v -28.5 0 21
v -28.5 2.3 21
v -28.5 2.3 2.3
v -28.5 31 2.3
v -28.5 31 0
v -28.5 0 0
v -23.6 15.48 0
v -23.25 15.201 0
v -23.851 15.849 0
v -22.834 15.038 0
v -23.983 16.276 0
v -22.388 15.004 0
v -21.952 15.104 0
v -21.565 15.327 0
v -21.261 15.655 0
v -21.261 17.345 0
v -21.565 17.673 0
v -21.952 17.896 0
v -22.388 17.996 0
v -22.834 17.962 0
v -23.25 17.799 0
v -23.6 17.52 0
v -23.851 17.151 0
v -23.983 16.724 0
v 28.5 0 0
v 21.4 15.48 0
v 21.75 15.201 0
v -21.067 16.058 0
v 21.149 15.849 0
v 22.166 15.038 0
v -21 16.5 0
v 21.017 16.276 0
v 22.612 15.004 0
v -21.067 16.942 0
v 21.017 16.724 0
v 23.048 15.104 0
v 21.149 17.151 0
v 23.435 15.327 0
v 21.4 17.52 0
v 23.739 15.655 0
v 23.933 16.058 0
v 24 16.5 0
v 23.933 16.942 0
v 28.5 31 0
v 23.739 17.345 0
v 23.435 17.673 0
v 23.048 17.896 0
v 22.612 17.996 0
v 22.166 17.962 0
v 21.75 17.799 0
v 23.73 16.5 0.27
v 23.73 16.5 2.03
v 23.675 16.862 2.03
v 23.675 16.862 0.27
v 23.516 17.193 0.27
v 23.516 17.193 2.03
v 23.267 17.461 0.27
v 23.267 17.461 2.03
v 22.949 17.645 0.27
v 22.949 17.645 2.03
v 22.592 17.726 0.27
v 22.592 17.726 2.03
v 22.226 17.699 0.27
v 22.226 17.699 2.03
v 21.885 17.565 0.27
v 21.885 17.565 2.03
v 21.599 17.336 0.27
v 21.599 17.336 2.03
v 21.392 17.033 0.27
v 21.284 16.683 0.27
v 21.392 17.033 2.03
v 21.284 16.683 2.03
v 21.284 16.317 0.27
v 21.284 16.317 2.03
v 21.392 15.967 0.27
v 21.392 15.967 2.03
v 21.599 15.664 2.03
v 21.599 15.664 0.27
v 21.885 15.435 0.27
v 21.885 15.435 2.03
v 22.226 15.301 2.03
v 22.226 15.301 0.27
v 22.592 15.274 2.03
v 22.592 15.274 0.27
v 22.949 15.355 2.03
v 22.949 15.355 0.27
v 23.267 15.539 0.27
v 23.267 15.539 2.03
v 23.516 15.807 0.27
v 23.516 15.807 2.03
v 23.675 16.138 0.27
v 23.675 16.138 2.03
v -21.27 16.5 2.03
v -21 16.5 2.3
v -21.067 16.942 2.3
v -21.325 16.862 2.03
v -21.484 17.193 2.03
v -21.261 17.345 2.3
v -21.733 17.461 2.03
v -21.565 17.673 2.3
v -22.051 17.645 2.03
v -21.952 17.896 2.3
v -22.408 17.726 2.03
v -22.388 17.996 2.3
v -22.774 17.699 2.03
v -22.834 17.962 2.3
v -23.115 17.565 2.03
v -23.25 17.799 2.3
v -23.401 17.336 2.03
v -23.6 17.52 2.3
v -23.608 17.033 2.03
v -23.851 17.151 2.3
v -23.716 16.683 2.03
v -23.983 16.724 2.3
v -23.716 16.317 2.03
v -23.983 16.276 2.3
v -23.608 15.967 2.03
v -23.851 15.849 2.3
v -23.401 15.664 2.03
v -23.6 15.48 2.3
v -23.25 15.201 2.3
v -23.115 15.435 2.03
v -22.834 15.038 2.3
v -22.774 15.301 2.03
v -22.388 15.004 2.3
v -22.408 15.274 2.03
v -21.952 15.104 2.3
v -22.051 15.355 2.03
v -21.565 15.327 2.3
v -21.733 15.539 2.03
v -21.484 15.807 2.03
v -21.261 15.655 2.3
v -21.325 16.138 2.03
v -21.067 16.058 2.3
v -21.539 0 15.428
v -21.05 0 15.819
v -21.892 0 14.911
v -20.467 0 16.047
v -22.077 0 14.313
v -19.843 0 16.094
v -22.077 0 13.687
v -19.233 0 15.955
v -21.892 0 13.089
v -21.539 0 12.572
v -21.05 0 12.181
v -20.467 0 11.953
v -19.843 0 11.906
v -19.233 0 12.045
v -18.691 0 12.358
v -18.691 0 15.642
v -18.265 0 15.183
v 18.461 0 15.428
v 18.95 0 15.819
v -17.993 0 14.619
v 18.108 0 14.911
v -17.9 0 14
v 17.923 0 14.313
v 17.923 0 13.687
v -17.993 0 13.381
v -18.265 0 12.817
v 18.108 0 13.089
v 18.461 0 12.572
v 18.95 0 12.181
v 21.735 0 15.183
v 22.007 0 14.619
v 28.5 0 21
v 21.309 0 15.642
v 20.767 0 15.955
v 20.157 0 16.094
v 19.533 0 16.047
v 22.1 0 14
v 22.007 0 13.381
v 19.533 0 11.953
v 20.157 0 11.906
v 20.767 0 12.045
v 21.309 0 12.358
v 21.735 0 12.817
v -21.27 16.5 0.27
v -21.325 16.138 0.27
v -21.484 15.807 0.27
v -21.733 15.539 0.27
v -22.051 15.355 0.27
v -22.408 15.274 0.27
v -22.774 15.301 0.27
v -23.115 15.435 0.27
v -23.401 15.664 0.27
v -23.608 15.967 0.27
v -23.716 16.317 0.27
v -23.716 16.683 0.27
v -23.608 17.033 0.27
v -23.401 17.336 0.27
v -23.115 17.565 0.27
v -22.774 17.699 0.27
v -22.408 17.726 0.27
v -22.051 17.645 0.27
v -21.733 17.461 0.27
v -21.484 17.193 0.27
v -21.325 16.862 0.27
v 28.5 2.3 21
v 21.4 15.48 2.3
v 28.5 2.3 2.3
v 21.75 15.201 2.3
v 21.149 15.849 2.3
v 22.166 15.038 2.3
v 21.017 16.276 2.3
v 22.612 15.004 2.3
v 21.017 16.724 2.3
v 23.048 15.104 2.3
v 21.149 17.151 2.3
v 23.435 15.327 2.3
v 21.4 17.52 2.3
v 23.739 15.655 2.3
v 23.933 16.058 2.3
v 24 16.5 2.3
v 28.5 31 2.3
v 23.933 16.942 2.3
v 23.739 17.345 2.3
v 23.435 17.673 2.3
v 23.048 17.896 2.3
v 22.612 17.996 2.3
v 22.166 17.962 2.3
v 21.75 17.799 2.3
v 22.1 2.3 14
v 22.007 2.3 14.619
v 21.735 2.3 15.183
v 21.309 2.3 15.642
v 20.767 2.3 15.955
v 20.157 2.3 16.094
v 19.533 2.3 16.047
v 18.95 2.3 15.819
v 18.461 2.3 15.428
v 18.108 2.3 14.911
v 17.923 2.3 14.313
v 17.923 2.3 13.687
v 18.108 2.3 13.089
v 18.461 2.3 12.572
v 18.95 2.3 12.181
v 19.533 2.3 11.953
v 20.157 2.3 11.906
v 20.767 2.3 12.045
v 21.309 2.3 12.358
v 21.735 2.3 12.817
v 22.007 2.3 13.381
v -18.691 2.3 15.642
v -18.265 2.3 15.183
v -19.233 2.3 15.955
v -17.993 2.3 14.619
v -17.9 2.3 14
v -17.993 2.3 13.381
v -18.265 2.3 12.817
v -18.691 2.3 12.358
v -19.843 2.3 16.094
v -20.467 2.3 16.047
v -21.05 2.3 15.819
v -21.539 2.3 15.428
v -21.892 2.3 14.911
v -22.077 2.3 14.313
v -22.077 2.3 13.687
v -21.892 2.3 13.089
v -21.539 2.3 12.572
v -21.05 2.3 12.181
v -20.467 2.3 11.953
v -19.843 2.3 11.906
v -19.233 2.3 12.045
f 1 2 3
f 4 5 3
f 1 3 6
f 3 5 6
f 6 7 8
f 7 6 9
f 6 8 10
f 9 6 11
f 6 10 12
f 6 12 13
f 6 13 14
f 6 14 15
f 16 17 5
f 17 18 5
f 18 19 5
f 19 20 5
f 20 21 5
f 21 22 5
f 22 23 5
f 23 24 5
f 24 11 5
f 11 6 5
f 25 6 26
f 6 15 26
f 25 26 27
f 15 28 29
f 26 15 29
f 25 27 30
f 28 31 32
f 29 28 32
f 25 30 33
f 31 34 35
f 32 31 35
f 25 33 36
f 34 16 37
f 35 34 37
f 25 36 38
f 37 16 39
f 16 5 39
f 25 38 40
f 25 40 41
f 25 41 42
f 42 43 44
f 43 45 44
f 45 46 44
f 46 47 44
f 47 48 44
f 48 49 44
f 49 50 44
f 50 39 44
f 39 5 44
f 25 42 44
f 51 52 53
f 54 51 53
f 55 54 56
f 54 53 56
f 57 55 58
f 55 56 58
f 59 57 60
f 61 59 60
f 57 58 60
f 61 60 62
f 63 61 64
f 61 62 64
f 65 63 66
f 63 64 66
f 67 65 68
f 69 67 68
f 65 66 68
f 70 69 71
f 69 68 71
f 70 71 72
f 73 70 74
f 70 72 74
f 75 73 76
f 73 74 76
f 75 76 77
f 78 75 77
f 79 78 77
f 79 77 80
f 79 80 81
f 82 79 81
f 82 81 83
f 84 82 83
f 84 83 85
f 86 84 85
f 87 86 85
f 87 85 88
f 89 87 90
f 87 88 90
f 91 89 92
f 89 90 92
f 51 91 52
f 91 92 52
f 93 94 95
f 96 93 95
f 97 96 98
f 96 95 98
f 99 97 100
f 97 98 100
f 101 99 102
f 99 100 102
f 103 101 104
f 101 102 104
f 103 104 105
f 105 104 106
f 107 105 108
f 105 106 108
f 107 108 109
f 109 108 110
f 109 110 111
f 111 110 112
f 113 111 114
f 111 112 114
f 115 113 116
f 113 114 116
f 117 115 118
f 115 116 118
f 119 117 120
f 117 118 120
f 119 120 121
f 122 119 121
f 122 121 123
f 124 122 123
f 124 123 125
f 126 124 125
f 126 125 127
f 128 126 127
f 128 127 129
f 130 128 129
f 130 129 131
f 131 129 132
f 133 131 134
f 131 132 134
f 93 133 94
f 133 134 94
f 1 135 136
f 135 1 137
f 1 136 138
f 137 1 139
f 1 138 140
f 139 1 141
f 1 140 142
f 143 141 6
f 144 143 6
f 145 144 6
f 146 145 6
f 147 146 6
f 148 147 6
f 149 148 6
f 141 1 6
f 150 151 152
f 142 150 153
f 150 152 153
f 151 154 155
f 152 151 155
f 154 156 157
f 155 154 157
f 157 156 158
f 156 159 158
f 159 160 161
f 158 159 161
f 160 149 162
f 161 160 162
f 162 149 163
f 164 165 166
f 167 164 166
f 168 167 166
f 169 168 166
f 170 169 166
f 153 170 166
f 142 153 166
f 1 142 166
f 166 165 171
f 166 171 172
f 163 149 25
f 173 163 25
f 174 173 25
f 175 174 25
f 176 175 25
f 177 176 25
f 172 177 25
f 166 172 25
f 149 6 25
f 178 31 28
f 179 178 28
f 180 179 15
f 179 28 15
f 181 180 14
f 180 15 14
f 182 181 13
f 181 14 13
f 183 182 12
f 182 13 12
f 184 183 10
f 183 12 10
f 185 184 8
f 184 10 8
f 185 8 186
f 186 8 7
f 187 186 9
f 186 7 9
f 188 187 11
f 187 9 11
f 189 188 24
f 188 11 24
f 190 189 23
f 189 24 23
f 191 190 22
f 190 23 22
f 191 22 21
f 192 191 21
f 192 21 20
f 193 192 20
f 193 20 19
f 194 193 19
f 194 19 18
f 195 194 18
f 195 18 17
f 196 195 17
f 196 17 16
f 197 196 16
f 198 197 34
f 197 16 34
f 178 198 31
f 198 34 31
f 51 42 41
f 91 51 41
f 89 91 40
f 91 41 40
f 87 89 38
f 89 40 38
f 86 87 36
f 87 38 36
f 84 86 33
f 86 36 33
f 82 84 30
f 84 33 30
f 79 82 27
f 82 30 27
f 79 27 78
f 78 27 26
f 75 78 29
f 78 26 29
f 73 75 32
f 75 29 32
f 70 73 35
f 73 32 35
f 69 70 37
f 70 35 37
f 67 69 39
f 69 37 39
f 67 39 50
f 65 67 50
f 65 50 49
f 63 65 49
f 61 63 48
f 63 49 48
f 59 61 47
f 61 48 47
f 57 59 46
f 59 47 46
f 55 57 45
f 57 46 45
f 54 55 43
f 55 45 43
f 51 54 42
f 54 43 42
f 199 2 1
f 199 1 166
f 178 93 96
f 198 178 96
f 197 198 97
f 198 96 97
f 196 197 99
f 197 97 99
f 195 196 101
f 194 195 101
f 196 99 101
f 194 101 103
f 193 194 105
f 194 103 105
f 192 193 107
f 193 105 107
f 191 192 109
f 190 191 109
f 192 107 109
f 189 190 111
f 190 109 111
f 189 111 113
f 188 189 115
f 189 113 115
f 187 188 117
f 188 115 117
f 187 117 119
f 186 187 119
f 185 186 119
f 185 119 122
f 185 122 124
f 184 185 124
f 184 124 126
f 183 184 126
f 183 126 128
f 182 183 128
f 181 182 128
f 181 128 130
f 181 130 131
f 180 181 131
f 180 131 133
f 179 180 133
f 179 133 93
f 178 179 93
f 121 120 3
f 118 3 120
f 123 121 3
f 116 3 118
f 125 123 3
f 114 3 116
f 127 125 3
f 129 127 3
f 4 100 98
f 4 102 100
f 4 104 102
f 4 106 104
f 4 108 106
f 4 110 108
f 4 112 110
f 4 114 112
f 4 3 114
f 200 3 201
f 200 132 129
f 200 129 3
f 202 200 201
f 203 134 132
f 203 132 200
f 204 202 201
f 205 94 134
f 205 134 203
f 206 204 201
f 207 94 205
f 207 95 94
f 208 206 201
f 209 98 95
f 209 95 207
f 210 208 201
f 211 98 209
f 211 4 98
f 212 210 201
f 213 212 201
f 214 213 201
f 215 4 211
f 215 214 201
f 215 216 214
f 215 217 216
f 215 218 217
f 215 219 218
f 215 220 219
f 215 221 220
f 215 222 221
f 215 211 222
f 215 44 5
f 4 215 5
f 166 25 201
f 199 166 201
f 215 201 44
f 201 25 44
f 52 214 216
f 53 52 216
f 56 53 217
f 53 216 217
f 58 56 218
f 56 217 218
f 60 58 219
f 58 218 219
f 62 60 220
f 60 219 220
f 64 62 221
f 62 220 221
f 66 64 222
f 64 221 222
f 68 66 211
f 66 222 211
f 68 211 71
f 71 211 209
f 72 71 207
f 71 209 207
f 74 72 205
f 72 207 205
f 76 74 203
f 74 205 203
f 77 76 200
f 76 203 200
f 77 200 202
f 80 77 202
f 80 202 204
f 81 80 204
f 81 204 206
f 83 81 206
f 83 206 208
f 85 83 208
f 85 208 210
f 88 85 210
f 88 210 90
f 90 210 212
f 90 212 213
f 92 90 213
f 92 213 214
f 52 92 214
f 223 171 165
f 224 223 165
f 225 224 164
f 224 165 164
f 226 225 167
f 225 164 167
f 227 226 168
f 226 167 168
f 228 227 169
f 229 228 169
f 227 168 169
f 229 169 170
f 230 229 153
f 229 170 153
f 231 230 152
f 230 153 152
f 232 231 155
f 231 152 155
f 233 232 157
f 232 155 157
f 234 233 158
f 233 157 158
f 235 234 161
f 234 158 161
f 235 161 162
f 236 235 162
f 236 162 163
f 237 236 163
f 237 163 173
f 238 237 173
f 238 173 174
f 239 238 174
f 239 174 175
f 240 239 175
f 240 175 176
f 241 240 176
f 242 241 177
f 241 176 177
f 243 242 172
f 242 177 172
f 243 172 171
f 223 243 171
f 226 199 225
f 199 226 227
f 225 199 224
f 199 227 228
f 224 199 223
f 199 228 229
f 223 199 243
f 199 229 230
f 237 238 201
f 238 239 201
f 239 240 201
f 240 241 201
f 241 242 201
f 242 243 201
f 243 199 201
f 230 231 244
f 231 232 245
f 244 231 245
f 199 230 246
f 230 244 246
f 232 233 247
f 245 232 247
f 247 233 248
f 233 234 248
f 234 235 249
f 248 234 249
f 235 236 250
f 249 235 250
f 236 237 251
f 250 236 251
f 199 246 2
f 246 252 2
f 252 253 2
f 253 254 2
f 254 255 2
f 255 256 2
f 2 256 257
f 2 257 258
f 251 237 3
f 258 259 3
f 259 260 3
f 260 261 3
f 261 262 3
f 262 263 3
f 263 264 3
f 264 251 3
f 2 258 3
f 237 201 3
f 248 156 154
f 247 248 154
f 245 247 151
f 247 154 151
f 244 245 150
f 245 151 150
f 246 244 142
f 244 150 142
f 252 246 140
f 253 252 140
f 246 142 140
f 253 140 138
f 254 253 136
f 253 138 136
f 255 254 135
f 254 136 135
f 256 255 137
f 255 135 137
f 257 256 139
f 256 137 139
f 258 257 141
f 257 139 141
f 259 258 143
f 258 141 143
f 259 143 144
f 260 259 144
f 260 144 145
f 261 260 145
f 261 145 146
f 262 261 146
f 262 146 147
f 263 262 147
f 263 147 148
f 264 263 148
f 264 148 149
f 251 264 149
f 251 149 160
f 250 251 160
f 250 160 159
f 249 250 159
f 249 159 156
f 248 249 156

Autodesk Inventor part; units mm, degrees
sketch "Sketch_1" plane through (0, 0, 0) normal (0, 0, 1) x (1, 0, 0)
  line L0 (-28.5, 0) -> (28.5, 0)
  line L1 (28.5, 0) -> (28.5, 31)
  line L2 (28.5, 31) -> (-28.5, 31)
  line L3 (-28.5, 31) -> (-28.5, 0)
extrude "Extrusion1" add sketch "Sketch_1" along normal blind 2.3
sketch "Sketch_3" plane through (0, 16.5, 0) normal (0, 1, 0) x (1, 0, 0)
  line L0 (22.5, -2.3) -> (22.5, 0)
  line L1 (22.5, 0) -> (24, 0)
  line L2 (24, 0) -> (23.7295, -0.2705)
  line L3 (23.7295, -0.2705) -> (23.7295, -2.0295)
  line L4 (23.7295, -2.0295) -> (24, -2.3)
  line L5 (24, -2.3) -> (22.5, -2.3)
  line L6 (22.5, -2.3) -> (22.5, 0)
revolve "Revolution1" cut sketch "Sketch_3" angle 360 about axis through (22.5, 16.5, 2.3) along (0, 0, 1)
thread "Thread1" size "M3x0.5" class "6H" standard "ISO Metric profile" full length
sketch "Sketch_2" plane through (0, 16.5, 0) normal (0, 1, 0) x (1, 0, 0)
  line L0 (-22.5, -2.3) -> (-22.5, 0)
  line L1 (-22.5, 0) -> (-21, 0)
  line L2 (-21, 0) -> (-21.2705, -0.2705)
  line L3 (-21.2705, -0.2705) -> (-21.2705, -2.0295)
  line L4 (-21.2705, -2.0295) -> (-21, -2.3)
  line L5 (-21, -2.3) -> (-22.5, -2.3)
  line L6 (-22.5, -2.3) -> (-22.5, 0)
revolve "Revolution2" cut sketch "Sketch_2" angle 360 about axis through (-22.5, 16.5, 2.3) along (0, 0, 1)
thread "Thread2" size "M3x0.5" class "6H" standard "ISO Metric profile" full length
sketch "Sketch_10" plane through (0, 0, 0) normal (0, 0, 1) x (1, 0, 0)
  line L0 (-28.5, 0) -> (28.5, 0)
  line L1 (28.5, 0) -> (28.5, 2.3)
  line L2 (28.5, 2.3) -> (-28.5, 2.3)
  line L3 (-28.5, 2.3) -> (-28.5, 0)
extrude "Extrusion2" add sketch "Sketch_10" along normal blind 21
sketch "Sketch_11" plane through (0, 0, 14) normal (0, 0, 1) x (1, 0, 0)
  line L0 (20, 0) -> (20, 2.3)
  line L1 (20, 2.3) -> (22.1, 2.3)
  line L2 (22.1, 2.3) -> (22.1, 0)
  line L3 (22.1, 0) -> (20, 0)
  line L4 (20, 0) -> (20, 2.3)
revolve "Revolution3" cut sketch "Sketch_11" angle 360 about axis through (20, 0, 14) along (0, -1, 0)
sketch "Sketch_12" plane through (0, 0, 14) normal (0, 0, 1) x (1, 0, 0)
  line L0 (-20, 0) -> (-20, 2.3)
  line L1 (-20, 2.3) -> (-17.9, 2.3)
  line L2 (-17.9, 2.3) -> (-17.9, 0)
  line L3 (-17.9, 0) -> (-20, 0)
  line L4 (-20, 0) -> (-20, 2.3)
revolve "Revolution4" cut sketch "Sketch_12" angle 360 about axis through (-20, 0, 14) along (0, -1, 0)
ref_plane "mgn_screw1_XY" through (22.5, 16.5, 0) normal (0, 0, 1) x (1, 0, 0)
ref_plane "mgn_screw1_YZ" through (22.5, 16.5, 0) normal (1, 0, 0) x (0, 1, 0)
ref_plane "mgn_screw1_ZX" through (22.5, 16.5, 0) normal (0, 1, 0) x (0, 0, 1)
ref_plane "mgn_screw2_XY" through (-22.5, 16.5, 0) normal (0, 0, 1) x (1, 0, 0)
ref_plane "mgn_screw2_YZ" through (-22.5, 16.5, 0) normal (1, 0, 0) x (0, 1, 0)
ref_plane "mgn_screw2_ZX" through (-22.5, 16.5, 0) normal (0, 1, 0) x (0, 0, 1)
ref_plane "plate_screw1_XY" through (-20, 0, 14) normal (0, 1, 0) x (1, 0, 0)
ref_plane "plate_screw1_YZ" through (-20, 0, 14) normal (1, 0, 0) x (0, 0, -1)
ref_plane "plate_screw1_ZX" through (-20, 0, 14) normal (0, 0, -1) x (0, 1, 0)
ref_plane "plate_screw2_XY" through (20, 0, 14) normal (0, 1, 0) x (1, 0, 0)
ref_plane "plate_screw2_YZ" through (20, 0, 14) normal (1, 0, 0) x (0, 0, -1)
ref_plane "plate_screw2_ZX" through (20, 0, 14) normal (0, 0, -1) x (0, 1, 0)
properties part number "ME5-5"
